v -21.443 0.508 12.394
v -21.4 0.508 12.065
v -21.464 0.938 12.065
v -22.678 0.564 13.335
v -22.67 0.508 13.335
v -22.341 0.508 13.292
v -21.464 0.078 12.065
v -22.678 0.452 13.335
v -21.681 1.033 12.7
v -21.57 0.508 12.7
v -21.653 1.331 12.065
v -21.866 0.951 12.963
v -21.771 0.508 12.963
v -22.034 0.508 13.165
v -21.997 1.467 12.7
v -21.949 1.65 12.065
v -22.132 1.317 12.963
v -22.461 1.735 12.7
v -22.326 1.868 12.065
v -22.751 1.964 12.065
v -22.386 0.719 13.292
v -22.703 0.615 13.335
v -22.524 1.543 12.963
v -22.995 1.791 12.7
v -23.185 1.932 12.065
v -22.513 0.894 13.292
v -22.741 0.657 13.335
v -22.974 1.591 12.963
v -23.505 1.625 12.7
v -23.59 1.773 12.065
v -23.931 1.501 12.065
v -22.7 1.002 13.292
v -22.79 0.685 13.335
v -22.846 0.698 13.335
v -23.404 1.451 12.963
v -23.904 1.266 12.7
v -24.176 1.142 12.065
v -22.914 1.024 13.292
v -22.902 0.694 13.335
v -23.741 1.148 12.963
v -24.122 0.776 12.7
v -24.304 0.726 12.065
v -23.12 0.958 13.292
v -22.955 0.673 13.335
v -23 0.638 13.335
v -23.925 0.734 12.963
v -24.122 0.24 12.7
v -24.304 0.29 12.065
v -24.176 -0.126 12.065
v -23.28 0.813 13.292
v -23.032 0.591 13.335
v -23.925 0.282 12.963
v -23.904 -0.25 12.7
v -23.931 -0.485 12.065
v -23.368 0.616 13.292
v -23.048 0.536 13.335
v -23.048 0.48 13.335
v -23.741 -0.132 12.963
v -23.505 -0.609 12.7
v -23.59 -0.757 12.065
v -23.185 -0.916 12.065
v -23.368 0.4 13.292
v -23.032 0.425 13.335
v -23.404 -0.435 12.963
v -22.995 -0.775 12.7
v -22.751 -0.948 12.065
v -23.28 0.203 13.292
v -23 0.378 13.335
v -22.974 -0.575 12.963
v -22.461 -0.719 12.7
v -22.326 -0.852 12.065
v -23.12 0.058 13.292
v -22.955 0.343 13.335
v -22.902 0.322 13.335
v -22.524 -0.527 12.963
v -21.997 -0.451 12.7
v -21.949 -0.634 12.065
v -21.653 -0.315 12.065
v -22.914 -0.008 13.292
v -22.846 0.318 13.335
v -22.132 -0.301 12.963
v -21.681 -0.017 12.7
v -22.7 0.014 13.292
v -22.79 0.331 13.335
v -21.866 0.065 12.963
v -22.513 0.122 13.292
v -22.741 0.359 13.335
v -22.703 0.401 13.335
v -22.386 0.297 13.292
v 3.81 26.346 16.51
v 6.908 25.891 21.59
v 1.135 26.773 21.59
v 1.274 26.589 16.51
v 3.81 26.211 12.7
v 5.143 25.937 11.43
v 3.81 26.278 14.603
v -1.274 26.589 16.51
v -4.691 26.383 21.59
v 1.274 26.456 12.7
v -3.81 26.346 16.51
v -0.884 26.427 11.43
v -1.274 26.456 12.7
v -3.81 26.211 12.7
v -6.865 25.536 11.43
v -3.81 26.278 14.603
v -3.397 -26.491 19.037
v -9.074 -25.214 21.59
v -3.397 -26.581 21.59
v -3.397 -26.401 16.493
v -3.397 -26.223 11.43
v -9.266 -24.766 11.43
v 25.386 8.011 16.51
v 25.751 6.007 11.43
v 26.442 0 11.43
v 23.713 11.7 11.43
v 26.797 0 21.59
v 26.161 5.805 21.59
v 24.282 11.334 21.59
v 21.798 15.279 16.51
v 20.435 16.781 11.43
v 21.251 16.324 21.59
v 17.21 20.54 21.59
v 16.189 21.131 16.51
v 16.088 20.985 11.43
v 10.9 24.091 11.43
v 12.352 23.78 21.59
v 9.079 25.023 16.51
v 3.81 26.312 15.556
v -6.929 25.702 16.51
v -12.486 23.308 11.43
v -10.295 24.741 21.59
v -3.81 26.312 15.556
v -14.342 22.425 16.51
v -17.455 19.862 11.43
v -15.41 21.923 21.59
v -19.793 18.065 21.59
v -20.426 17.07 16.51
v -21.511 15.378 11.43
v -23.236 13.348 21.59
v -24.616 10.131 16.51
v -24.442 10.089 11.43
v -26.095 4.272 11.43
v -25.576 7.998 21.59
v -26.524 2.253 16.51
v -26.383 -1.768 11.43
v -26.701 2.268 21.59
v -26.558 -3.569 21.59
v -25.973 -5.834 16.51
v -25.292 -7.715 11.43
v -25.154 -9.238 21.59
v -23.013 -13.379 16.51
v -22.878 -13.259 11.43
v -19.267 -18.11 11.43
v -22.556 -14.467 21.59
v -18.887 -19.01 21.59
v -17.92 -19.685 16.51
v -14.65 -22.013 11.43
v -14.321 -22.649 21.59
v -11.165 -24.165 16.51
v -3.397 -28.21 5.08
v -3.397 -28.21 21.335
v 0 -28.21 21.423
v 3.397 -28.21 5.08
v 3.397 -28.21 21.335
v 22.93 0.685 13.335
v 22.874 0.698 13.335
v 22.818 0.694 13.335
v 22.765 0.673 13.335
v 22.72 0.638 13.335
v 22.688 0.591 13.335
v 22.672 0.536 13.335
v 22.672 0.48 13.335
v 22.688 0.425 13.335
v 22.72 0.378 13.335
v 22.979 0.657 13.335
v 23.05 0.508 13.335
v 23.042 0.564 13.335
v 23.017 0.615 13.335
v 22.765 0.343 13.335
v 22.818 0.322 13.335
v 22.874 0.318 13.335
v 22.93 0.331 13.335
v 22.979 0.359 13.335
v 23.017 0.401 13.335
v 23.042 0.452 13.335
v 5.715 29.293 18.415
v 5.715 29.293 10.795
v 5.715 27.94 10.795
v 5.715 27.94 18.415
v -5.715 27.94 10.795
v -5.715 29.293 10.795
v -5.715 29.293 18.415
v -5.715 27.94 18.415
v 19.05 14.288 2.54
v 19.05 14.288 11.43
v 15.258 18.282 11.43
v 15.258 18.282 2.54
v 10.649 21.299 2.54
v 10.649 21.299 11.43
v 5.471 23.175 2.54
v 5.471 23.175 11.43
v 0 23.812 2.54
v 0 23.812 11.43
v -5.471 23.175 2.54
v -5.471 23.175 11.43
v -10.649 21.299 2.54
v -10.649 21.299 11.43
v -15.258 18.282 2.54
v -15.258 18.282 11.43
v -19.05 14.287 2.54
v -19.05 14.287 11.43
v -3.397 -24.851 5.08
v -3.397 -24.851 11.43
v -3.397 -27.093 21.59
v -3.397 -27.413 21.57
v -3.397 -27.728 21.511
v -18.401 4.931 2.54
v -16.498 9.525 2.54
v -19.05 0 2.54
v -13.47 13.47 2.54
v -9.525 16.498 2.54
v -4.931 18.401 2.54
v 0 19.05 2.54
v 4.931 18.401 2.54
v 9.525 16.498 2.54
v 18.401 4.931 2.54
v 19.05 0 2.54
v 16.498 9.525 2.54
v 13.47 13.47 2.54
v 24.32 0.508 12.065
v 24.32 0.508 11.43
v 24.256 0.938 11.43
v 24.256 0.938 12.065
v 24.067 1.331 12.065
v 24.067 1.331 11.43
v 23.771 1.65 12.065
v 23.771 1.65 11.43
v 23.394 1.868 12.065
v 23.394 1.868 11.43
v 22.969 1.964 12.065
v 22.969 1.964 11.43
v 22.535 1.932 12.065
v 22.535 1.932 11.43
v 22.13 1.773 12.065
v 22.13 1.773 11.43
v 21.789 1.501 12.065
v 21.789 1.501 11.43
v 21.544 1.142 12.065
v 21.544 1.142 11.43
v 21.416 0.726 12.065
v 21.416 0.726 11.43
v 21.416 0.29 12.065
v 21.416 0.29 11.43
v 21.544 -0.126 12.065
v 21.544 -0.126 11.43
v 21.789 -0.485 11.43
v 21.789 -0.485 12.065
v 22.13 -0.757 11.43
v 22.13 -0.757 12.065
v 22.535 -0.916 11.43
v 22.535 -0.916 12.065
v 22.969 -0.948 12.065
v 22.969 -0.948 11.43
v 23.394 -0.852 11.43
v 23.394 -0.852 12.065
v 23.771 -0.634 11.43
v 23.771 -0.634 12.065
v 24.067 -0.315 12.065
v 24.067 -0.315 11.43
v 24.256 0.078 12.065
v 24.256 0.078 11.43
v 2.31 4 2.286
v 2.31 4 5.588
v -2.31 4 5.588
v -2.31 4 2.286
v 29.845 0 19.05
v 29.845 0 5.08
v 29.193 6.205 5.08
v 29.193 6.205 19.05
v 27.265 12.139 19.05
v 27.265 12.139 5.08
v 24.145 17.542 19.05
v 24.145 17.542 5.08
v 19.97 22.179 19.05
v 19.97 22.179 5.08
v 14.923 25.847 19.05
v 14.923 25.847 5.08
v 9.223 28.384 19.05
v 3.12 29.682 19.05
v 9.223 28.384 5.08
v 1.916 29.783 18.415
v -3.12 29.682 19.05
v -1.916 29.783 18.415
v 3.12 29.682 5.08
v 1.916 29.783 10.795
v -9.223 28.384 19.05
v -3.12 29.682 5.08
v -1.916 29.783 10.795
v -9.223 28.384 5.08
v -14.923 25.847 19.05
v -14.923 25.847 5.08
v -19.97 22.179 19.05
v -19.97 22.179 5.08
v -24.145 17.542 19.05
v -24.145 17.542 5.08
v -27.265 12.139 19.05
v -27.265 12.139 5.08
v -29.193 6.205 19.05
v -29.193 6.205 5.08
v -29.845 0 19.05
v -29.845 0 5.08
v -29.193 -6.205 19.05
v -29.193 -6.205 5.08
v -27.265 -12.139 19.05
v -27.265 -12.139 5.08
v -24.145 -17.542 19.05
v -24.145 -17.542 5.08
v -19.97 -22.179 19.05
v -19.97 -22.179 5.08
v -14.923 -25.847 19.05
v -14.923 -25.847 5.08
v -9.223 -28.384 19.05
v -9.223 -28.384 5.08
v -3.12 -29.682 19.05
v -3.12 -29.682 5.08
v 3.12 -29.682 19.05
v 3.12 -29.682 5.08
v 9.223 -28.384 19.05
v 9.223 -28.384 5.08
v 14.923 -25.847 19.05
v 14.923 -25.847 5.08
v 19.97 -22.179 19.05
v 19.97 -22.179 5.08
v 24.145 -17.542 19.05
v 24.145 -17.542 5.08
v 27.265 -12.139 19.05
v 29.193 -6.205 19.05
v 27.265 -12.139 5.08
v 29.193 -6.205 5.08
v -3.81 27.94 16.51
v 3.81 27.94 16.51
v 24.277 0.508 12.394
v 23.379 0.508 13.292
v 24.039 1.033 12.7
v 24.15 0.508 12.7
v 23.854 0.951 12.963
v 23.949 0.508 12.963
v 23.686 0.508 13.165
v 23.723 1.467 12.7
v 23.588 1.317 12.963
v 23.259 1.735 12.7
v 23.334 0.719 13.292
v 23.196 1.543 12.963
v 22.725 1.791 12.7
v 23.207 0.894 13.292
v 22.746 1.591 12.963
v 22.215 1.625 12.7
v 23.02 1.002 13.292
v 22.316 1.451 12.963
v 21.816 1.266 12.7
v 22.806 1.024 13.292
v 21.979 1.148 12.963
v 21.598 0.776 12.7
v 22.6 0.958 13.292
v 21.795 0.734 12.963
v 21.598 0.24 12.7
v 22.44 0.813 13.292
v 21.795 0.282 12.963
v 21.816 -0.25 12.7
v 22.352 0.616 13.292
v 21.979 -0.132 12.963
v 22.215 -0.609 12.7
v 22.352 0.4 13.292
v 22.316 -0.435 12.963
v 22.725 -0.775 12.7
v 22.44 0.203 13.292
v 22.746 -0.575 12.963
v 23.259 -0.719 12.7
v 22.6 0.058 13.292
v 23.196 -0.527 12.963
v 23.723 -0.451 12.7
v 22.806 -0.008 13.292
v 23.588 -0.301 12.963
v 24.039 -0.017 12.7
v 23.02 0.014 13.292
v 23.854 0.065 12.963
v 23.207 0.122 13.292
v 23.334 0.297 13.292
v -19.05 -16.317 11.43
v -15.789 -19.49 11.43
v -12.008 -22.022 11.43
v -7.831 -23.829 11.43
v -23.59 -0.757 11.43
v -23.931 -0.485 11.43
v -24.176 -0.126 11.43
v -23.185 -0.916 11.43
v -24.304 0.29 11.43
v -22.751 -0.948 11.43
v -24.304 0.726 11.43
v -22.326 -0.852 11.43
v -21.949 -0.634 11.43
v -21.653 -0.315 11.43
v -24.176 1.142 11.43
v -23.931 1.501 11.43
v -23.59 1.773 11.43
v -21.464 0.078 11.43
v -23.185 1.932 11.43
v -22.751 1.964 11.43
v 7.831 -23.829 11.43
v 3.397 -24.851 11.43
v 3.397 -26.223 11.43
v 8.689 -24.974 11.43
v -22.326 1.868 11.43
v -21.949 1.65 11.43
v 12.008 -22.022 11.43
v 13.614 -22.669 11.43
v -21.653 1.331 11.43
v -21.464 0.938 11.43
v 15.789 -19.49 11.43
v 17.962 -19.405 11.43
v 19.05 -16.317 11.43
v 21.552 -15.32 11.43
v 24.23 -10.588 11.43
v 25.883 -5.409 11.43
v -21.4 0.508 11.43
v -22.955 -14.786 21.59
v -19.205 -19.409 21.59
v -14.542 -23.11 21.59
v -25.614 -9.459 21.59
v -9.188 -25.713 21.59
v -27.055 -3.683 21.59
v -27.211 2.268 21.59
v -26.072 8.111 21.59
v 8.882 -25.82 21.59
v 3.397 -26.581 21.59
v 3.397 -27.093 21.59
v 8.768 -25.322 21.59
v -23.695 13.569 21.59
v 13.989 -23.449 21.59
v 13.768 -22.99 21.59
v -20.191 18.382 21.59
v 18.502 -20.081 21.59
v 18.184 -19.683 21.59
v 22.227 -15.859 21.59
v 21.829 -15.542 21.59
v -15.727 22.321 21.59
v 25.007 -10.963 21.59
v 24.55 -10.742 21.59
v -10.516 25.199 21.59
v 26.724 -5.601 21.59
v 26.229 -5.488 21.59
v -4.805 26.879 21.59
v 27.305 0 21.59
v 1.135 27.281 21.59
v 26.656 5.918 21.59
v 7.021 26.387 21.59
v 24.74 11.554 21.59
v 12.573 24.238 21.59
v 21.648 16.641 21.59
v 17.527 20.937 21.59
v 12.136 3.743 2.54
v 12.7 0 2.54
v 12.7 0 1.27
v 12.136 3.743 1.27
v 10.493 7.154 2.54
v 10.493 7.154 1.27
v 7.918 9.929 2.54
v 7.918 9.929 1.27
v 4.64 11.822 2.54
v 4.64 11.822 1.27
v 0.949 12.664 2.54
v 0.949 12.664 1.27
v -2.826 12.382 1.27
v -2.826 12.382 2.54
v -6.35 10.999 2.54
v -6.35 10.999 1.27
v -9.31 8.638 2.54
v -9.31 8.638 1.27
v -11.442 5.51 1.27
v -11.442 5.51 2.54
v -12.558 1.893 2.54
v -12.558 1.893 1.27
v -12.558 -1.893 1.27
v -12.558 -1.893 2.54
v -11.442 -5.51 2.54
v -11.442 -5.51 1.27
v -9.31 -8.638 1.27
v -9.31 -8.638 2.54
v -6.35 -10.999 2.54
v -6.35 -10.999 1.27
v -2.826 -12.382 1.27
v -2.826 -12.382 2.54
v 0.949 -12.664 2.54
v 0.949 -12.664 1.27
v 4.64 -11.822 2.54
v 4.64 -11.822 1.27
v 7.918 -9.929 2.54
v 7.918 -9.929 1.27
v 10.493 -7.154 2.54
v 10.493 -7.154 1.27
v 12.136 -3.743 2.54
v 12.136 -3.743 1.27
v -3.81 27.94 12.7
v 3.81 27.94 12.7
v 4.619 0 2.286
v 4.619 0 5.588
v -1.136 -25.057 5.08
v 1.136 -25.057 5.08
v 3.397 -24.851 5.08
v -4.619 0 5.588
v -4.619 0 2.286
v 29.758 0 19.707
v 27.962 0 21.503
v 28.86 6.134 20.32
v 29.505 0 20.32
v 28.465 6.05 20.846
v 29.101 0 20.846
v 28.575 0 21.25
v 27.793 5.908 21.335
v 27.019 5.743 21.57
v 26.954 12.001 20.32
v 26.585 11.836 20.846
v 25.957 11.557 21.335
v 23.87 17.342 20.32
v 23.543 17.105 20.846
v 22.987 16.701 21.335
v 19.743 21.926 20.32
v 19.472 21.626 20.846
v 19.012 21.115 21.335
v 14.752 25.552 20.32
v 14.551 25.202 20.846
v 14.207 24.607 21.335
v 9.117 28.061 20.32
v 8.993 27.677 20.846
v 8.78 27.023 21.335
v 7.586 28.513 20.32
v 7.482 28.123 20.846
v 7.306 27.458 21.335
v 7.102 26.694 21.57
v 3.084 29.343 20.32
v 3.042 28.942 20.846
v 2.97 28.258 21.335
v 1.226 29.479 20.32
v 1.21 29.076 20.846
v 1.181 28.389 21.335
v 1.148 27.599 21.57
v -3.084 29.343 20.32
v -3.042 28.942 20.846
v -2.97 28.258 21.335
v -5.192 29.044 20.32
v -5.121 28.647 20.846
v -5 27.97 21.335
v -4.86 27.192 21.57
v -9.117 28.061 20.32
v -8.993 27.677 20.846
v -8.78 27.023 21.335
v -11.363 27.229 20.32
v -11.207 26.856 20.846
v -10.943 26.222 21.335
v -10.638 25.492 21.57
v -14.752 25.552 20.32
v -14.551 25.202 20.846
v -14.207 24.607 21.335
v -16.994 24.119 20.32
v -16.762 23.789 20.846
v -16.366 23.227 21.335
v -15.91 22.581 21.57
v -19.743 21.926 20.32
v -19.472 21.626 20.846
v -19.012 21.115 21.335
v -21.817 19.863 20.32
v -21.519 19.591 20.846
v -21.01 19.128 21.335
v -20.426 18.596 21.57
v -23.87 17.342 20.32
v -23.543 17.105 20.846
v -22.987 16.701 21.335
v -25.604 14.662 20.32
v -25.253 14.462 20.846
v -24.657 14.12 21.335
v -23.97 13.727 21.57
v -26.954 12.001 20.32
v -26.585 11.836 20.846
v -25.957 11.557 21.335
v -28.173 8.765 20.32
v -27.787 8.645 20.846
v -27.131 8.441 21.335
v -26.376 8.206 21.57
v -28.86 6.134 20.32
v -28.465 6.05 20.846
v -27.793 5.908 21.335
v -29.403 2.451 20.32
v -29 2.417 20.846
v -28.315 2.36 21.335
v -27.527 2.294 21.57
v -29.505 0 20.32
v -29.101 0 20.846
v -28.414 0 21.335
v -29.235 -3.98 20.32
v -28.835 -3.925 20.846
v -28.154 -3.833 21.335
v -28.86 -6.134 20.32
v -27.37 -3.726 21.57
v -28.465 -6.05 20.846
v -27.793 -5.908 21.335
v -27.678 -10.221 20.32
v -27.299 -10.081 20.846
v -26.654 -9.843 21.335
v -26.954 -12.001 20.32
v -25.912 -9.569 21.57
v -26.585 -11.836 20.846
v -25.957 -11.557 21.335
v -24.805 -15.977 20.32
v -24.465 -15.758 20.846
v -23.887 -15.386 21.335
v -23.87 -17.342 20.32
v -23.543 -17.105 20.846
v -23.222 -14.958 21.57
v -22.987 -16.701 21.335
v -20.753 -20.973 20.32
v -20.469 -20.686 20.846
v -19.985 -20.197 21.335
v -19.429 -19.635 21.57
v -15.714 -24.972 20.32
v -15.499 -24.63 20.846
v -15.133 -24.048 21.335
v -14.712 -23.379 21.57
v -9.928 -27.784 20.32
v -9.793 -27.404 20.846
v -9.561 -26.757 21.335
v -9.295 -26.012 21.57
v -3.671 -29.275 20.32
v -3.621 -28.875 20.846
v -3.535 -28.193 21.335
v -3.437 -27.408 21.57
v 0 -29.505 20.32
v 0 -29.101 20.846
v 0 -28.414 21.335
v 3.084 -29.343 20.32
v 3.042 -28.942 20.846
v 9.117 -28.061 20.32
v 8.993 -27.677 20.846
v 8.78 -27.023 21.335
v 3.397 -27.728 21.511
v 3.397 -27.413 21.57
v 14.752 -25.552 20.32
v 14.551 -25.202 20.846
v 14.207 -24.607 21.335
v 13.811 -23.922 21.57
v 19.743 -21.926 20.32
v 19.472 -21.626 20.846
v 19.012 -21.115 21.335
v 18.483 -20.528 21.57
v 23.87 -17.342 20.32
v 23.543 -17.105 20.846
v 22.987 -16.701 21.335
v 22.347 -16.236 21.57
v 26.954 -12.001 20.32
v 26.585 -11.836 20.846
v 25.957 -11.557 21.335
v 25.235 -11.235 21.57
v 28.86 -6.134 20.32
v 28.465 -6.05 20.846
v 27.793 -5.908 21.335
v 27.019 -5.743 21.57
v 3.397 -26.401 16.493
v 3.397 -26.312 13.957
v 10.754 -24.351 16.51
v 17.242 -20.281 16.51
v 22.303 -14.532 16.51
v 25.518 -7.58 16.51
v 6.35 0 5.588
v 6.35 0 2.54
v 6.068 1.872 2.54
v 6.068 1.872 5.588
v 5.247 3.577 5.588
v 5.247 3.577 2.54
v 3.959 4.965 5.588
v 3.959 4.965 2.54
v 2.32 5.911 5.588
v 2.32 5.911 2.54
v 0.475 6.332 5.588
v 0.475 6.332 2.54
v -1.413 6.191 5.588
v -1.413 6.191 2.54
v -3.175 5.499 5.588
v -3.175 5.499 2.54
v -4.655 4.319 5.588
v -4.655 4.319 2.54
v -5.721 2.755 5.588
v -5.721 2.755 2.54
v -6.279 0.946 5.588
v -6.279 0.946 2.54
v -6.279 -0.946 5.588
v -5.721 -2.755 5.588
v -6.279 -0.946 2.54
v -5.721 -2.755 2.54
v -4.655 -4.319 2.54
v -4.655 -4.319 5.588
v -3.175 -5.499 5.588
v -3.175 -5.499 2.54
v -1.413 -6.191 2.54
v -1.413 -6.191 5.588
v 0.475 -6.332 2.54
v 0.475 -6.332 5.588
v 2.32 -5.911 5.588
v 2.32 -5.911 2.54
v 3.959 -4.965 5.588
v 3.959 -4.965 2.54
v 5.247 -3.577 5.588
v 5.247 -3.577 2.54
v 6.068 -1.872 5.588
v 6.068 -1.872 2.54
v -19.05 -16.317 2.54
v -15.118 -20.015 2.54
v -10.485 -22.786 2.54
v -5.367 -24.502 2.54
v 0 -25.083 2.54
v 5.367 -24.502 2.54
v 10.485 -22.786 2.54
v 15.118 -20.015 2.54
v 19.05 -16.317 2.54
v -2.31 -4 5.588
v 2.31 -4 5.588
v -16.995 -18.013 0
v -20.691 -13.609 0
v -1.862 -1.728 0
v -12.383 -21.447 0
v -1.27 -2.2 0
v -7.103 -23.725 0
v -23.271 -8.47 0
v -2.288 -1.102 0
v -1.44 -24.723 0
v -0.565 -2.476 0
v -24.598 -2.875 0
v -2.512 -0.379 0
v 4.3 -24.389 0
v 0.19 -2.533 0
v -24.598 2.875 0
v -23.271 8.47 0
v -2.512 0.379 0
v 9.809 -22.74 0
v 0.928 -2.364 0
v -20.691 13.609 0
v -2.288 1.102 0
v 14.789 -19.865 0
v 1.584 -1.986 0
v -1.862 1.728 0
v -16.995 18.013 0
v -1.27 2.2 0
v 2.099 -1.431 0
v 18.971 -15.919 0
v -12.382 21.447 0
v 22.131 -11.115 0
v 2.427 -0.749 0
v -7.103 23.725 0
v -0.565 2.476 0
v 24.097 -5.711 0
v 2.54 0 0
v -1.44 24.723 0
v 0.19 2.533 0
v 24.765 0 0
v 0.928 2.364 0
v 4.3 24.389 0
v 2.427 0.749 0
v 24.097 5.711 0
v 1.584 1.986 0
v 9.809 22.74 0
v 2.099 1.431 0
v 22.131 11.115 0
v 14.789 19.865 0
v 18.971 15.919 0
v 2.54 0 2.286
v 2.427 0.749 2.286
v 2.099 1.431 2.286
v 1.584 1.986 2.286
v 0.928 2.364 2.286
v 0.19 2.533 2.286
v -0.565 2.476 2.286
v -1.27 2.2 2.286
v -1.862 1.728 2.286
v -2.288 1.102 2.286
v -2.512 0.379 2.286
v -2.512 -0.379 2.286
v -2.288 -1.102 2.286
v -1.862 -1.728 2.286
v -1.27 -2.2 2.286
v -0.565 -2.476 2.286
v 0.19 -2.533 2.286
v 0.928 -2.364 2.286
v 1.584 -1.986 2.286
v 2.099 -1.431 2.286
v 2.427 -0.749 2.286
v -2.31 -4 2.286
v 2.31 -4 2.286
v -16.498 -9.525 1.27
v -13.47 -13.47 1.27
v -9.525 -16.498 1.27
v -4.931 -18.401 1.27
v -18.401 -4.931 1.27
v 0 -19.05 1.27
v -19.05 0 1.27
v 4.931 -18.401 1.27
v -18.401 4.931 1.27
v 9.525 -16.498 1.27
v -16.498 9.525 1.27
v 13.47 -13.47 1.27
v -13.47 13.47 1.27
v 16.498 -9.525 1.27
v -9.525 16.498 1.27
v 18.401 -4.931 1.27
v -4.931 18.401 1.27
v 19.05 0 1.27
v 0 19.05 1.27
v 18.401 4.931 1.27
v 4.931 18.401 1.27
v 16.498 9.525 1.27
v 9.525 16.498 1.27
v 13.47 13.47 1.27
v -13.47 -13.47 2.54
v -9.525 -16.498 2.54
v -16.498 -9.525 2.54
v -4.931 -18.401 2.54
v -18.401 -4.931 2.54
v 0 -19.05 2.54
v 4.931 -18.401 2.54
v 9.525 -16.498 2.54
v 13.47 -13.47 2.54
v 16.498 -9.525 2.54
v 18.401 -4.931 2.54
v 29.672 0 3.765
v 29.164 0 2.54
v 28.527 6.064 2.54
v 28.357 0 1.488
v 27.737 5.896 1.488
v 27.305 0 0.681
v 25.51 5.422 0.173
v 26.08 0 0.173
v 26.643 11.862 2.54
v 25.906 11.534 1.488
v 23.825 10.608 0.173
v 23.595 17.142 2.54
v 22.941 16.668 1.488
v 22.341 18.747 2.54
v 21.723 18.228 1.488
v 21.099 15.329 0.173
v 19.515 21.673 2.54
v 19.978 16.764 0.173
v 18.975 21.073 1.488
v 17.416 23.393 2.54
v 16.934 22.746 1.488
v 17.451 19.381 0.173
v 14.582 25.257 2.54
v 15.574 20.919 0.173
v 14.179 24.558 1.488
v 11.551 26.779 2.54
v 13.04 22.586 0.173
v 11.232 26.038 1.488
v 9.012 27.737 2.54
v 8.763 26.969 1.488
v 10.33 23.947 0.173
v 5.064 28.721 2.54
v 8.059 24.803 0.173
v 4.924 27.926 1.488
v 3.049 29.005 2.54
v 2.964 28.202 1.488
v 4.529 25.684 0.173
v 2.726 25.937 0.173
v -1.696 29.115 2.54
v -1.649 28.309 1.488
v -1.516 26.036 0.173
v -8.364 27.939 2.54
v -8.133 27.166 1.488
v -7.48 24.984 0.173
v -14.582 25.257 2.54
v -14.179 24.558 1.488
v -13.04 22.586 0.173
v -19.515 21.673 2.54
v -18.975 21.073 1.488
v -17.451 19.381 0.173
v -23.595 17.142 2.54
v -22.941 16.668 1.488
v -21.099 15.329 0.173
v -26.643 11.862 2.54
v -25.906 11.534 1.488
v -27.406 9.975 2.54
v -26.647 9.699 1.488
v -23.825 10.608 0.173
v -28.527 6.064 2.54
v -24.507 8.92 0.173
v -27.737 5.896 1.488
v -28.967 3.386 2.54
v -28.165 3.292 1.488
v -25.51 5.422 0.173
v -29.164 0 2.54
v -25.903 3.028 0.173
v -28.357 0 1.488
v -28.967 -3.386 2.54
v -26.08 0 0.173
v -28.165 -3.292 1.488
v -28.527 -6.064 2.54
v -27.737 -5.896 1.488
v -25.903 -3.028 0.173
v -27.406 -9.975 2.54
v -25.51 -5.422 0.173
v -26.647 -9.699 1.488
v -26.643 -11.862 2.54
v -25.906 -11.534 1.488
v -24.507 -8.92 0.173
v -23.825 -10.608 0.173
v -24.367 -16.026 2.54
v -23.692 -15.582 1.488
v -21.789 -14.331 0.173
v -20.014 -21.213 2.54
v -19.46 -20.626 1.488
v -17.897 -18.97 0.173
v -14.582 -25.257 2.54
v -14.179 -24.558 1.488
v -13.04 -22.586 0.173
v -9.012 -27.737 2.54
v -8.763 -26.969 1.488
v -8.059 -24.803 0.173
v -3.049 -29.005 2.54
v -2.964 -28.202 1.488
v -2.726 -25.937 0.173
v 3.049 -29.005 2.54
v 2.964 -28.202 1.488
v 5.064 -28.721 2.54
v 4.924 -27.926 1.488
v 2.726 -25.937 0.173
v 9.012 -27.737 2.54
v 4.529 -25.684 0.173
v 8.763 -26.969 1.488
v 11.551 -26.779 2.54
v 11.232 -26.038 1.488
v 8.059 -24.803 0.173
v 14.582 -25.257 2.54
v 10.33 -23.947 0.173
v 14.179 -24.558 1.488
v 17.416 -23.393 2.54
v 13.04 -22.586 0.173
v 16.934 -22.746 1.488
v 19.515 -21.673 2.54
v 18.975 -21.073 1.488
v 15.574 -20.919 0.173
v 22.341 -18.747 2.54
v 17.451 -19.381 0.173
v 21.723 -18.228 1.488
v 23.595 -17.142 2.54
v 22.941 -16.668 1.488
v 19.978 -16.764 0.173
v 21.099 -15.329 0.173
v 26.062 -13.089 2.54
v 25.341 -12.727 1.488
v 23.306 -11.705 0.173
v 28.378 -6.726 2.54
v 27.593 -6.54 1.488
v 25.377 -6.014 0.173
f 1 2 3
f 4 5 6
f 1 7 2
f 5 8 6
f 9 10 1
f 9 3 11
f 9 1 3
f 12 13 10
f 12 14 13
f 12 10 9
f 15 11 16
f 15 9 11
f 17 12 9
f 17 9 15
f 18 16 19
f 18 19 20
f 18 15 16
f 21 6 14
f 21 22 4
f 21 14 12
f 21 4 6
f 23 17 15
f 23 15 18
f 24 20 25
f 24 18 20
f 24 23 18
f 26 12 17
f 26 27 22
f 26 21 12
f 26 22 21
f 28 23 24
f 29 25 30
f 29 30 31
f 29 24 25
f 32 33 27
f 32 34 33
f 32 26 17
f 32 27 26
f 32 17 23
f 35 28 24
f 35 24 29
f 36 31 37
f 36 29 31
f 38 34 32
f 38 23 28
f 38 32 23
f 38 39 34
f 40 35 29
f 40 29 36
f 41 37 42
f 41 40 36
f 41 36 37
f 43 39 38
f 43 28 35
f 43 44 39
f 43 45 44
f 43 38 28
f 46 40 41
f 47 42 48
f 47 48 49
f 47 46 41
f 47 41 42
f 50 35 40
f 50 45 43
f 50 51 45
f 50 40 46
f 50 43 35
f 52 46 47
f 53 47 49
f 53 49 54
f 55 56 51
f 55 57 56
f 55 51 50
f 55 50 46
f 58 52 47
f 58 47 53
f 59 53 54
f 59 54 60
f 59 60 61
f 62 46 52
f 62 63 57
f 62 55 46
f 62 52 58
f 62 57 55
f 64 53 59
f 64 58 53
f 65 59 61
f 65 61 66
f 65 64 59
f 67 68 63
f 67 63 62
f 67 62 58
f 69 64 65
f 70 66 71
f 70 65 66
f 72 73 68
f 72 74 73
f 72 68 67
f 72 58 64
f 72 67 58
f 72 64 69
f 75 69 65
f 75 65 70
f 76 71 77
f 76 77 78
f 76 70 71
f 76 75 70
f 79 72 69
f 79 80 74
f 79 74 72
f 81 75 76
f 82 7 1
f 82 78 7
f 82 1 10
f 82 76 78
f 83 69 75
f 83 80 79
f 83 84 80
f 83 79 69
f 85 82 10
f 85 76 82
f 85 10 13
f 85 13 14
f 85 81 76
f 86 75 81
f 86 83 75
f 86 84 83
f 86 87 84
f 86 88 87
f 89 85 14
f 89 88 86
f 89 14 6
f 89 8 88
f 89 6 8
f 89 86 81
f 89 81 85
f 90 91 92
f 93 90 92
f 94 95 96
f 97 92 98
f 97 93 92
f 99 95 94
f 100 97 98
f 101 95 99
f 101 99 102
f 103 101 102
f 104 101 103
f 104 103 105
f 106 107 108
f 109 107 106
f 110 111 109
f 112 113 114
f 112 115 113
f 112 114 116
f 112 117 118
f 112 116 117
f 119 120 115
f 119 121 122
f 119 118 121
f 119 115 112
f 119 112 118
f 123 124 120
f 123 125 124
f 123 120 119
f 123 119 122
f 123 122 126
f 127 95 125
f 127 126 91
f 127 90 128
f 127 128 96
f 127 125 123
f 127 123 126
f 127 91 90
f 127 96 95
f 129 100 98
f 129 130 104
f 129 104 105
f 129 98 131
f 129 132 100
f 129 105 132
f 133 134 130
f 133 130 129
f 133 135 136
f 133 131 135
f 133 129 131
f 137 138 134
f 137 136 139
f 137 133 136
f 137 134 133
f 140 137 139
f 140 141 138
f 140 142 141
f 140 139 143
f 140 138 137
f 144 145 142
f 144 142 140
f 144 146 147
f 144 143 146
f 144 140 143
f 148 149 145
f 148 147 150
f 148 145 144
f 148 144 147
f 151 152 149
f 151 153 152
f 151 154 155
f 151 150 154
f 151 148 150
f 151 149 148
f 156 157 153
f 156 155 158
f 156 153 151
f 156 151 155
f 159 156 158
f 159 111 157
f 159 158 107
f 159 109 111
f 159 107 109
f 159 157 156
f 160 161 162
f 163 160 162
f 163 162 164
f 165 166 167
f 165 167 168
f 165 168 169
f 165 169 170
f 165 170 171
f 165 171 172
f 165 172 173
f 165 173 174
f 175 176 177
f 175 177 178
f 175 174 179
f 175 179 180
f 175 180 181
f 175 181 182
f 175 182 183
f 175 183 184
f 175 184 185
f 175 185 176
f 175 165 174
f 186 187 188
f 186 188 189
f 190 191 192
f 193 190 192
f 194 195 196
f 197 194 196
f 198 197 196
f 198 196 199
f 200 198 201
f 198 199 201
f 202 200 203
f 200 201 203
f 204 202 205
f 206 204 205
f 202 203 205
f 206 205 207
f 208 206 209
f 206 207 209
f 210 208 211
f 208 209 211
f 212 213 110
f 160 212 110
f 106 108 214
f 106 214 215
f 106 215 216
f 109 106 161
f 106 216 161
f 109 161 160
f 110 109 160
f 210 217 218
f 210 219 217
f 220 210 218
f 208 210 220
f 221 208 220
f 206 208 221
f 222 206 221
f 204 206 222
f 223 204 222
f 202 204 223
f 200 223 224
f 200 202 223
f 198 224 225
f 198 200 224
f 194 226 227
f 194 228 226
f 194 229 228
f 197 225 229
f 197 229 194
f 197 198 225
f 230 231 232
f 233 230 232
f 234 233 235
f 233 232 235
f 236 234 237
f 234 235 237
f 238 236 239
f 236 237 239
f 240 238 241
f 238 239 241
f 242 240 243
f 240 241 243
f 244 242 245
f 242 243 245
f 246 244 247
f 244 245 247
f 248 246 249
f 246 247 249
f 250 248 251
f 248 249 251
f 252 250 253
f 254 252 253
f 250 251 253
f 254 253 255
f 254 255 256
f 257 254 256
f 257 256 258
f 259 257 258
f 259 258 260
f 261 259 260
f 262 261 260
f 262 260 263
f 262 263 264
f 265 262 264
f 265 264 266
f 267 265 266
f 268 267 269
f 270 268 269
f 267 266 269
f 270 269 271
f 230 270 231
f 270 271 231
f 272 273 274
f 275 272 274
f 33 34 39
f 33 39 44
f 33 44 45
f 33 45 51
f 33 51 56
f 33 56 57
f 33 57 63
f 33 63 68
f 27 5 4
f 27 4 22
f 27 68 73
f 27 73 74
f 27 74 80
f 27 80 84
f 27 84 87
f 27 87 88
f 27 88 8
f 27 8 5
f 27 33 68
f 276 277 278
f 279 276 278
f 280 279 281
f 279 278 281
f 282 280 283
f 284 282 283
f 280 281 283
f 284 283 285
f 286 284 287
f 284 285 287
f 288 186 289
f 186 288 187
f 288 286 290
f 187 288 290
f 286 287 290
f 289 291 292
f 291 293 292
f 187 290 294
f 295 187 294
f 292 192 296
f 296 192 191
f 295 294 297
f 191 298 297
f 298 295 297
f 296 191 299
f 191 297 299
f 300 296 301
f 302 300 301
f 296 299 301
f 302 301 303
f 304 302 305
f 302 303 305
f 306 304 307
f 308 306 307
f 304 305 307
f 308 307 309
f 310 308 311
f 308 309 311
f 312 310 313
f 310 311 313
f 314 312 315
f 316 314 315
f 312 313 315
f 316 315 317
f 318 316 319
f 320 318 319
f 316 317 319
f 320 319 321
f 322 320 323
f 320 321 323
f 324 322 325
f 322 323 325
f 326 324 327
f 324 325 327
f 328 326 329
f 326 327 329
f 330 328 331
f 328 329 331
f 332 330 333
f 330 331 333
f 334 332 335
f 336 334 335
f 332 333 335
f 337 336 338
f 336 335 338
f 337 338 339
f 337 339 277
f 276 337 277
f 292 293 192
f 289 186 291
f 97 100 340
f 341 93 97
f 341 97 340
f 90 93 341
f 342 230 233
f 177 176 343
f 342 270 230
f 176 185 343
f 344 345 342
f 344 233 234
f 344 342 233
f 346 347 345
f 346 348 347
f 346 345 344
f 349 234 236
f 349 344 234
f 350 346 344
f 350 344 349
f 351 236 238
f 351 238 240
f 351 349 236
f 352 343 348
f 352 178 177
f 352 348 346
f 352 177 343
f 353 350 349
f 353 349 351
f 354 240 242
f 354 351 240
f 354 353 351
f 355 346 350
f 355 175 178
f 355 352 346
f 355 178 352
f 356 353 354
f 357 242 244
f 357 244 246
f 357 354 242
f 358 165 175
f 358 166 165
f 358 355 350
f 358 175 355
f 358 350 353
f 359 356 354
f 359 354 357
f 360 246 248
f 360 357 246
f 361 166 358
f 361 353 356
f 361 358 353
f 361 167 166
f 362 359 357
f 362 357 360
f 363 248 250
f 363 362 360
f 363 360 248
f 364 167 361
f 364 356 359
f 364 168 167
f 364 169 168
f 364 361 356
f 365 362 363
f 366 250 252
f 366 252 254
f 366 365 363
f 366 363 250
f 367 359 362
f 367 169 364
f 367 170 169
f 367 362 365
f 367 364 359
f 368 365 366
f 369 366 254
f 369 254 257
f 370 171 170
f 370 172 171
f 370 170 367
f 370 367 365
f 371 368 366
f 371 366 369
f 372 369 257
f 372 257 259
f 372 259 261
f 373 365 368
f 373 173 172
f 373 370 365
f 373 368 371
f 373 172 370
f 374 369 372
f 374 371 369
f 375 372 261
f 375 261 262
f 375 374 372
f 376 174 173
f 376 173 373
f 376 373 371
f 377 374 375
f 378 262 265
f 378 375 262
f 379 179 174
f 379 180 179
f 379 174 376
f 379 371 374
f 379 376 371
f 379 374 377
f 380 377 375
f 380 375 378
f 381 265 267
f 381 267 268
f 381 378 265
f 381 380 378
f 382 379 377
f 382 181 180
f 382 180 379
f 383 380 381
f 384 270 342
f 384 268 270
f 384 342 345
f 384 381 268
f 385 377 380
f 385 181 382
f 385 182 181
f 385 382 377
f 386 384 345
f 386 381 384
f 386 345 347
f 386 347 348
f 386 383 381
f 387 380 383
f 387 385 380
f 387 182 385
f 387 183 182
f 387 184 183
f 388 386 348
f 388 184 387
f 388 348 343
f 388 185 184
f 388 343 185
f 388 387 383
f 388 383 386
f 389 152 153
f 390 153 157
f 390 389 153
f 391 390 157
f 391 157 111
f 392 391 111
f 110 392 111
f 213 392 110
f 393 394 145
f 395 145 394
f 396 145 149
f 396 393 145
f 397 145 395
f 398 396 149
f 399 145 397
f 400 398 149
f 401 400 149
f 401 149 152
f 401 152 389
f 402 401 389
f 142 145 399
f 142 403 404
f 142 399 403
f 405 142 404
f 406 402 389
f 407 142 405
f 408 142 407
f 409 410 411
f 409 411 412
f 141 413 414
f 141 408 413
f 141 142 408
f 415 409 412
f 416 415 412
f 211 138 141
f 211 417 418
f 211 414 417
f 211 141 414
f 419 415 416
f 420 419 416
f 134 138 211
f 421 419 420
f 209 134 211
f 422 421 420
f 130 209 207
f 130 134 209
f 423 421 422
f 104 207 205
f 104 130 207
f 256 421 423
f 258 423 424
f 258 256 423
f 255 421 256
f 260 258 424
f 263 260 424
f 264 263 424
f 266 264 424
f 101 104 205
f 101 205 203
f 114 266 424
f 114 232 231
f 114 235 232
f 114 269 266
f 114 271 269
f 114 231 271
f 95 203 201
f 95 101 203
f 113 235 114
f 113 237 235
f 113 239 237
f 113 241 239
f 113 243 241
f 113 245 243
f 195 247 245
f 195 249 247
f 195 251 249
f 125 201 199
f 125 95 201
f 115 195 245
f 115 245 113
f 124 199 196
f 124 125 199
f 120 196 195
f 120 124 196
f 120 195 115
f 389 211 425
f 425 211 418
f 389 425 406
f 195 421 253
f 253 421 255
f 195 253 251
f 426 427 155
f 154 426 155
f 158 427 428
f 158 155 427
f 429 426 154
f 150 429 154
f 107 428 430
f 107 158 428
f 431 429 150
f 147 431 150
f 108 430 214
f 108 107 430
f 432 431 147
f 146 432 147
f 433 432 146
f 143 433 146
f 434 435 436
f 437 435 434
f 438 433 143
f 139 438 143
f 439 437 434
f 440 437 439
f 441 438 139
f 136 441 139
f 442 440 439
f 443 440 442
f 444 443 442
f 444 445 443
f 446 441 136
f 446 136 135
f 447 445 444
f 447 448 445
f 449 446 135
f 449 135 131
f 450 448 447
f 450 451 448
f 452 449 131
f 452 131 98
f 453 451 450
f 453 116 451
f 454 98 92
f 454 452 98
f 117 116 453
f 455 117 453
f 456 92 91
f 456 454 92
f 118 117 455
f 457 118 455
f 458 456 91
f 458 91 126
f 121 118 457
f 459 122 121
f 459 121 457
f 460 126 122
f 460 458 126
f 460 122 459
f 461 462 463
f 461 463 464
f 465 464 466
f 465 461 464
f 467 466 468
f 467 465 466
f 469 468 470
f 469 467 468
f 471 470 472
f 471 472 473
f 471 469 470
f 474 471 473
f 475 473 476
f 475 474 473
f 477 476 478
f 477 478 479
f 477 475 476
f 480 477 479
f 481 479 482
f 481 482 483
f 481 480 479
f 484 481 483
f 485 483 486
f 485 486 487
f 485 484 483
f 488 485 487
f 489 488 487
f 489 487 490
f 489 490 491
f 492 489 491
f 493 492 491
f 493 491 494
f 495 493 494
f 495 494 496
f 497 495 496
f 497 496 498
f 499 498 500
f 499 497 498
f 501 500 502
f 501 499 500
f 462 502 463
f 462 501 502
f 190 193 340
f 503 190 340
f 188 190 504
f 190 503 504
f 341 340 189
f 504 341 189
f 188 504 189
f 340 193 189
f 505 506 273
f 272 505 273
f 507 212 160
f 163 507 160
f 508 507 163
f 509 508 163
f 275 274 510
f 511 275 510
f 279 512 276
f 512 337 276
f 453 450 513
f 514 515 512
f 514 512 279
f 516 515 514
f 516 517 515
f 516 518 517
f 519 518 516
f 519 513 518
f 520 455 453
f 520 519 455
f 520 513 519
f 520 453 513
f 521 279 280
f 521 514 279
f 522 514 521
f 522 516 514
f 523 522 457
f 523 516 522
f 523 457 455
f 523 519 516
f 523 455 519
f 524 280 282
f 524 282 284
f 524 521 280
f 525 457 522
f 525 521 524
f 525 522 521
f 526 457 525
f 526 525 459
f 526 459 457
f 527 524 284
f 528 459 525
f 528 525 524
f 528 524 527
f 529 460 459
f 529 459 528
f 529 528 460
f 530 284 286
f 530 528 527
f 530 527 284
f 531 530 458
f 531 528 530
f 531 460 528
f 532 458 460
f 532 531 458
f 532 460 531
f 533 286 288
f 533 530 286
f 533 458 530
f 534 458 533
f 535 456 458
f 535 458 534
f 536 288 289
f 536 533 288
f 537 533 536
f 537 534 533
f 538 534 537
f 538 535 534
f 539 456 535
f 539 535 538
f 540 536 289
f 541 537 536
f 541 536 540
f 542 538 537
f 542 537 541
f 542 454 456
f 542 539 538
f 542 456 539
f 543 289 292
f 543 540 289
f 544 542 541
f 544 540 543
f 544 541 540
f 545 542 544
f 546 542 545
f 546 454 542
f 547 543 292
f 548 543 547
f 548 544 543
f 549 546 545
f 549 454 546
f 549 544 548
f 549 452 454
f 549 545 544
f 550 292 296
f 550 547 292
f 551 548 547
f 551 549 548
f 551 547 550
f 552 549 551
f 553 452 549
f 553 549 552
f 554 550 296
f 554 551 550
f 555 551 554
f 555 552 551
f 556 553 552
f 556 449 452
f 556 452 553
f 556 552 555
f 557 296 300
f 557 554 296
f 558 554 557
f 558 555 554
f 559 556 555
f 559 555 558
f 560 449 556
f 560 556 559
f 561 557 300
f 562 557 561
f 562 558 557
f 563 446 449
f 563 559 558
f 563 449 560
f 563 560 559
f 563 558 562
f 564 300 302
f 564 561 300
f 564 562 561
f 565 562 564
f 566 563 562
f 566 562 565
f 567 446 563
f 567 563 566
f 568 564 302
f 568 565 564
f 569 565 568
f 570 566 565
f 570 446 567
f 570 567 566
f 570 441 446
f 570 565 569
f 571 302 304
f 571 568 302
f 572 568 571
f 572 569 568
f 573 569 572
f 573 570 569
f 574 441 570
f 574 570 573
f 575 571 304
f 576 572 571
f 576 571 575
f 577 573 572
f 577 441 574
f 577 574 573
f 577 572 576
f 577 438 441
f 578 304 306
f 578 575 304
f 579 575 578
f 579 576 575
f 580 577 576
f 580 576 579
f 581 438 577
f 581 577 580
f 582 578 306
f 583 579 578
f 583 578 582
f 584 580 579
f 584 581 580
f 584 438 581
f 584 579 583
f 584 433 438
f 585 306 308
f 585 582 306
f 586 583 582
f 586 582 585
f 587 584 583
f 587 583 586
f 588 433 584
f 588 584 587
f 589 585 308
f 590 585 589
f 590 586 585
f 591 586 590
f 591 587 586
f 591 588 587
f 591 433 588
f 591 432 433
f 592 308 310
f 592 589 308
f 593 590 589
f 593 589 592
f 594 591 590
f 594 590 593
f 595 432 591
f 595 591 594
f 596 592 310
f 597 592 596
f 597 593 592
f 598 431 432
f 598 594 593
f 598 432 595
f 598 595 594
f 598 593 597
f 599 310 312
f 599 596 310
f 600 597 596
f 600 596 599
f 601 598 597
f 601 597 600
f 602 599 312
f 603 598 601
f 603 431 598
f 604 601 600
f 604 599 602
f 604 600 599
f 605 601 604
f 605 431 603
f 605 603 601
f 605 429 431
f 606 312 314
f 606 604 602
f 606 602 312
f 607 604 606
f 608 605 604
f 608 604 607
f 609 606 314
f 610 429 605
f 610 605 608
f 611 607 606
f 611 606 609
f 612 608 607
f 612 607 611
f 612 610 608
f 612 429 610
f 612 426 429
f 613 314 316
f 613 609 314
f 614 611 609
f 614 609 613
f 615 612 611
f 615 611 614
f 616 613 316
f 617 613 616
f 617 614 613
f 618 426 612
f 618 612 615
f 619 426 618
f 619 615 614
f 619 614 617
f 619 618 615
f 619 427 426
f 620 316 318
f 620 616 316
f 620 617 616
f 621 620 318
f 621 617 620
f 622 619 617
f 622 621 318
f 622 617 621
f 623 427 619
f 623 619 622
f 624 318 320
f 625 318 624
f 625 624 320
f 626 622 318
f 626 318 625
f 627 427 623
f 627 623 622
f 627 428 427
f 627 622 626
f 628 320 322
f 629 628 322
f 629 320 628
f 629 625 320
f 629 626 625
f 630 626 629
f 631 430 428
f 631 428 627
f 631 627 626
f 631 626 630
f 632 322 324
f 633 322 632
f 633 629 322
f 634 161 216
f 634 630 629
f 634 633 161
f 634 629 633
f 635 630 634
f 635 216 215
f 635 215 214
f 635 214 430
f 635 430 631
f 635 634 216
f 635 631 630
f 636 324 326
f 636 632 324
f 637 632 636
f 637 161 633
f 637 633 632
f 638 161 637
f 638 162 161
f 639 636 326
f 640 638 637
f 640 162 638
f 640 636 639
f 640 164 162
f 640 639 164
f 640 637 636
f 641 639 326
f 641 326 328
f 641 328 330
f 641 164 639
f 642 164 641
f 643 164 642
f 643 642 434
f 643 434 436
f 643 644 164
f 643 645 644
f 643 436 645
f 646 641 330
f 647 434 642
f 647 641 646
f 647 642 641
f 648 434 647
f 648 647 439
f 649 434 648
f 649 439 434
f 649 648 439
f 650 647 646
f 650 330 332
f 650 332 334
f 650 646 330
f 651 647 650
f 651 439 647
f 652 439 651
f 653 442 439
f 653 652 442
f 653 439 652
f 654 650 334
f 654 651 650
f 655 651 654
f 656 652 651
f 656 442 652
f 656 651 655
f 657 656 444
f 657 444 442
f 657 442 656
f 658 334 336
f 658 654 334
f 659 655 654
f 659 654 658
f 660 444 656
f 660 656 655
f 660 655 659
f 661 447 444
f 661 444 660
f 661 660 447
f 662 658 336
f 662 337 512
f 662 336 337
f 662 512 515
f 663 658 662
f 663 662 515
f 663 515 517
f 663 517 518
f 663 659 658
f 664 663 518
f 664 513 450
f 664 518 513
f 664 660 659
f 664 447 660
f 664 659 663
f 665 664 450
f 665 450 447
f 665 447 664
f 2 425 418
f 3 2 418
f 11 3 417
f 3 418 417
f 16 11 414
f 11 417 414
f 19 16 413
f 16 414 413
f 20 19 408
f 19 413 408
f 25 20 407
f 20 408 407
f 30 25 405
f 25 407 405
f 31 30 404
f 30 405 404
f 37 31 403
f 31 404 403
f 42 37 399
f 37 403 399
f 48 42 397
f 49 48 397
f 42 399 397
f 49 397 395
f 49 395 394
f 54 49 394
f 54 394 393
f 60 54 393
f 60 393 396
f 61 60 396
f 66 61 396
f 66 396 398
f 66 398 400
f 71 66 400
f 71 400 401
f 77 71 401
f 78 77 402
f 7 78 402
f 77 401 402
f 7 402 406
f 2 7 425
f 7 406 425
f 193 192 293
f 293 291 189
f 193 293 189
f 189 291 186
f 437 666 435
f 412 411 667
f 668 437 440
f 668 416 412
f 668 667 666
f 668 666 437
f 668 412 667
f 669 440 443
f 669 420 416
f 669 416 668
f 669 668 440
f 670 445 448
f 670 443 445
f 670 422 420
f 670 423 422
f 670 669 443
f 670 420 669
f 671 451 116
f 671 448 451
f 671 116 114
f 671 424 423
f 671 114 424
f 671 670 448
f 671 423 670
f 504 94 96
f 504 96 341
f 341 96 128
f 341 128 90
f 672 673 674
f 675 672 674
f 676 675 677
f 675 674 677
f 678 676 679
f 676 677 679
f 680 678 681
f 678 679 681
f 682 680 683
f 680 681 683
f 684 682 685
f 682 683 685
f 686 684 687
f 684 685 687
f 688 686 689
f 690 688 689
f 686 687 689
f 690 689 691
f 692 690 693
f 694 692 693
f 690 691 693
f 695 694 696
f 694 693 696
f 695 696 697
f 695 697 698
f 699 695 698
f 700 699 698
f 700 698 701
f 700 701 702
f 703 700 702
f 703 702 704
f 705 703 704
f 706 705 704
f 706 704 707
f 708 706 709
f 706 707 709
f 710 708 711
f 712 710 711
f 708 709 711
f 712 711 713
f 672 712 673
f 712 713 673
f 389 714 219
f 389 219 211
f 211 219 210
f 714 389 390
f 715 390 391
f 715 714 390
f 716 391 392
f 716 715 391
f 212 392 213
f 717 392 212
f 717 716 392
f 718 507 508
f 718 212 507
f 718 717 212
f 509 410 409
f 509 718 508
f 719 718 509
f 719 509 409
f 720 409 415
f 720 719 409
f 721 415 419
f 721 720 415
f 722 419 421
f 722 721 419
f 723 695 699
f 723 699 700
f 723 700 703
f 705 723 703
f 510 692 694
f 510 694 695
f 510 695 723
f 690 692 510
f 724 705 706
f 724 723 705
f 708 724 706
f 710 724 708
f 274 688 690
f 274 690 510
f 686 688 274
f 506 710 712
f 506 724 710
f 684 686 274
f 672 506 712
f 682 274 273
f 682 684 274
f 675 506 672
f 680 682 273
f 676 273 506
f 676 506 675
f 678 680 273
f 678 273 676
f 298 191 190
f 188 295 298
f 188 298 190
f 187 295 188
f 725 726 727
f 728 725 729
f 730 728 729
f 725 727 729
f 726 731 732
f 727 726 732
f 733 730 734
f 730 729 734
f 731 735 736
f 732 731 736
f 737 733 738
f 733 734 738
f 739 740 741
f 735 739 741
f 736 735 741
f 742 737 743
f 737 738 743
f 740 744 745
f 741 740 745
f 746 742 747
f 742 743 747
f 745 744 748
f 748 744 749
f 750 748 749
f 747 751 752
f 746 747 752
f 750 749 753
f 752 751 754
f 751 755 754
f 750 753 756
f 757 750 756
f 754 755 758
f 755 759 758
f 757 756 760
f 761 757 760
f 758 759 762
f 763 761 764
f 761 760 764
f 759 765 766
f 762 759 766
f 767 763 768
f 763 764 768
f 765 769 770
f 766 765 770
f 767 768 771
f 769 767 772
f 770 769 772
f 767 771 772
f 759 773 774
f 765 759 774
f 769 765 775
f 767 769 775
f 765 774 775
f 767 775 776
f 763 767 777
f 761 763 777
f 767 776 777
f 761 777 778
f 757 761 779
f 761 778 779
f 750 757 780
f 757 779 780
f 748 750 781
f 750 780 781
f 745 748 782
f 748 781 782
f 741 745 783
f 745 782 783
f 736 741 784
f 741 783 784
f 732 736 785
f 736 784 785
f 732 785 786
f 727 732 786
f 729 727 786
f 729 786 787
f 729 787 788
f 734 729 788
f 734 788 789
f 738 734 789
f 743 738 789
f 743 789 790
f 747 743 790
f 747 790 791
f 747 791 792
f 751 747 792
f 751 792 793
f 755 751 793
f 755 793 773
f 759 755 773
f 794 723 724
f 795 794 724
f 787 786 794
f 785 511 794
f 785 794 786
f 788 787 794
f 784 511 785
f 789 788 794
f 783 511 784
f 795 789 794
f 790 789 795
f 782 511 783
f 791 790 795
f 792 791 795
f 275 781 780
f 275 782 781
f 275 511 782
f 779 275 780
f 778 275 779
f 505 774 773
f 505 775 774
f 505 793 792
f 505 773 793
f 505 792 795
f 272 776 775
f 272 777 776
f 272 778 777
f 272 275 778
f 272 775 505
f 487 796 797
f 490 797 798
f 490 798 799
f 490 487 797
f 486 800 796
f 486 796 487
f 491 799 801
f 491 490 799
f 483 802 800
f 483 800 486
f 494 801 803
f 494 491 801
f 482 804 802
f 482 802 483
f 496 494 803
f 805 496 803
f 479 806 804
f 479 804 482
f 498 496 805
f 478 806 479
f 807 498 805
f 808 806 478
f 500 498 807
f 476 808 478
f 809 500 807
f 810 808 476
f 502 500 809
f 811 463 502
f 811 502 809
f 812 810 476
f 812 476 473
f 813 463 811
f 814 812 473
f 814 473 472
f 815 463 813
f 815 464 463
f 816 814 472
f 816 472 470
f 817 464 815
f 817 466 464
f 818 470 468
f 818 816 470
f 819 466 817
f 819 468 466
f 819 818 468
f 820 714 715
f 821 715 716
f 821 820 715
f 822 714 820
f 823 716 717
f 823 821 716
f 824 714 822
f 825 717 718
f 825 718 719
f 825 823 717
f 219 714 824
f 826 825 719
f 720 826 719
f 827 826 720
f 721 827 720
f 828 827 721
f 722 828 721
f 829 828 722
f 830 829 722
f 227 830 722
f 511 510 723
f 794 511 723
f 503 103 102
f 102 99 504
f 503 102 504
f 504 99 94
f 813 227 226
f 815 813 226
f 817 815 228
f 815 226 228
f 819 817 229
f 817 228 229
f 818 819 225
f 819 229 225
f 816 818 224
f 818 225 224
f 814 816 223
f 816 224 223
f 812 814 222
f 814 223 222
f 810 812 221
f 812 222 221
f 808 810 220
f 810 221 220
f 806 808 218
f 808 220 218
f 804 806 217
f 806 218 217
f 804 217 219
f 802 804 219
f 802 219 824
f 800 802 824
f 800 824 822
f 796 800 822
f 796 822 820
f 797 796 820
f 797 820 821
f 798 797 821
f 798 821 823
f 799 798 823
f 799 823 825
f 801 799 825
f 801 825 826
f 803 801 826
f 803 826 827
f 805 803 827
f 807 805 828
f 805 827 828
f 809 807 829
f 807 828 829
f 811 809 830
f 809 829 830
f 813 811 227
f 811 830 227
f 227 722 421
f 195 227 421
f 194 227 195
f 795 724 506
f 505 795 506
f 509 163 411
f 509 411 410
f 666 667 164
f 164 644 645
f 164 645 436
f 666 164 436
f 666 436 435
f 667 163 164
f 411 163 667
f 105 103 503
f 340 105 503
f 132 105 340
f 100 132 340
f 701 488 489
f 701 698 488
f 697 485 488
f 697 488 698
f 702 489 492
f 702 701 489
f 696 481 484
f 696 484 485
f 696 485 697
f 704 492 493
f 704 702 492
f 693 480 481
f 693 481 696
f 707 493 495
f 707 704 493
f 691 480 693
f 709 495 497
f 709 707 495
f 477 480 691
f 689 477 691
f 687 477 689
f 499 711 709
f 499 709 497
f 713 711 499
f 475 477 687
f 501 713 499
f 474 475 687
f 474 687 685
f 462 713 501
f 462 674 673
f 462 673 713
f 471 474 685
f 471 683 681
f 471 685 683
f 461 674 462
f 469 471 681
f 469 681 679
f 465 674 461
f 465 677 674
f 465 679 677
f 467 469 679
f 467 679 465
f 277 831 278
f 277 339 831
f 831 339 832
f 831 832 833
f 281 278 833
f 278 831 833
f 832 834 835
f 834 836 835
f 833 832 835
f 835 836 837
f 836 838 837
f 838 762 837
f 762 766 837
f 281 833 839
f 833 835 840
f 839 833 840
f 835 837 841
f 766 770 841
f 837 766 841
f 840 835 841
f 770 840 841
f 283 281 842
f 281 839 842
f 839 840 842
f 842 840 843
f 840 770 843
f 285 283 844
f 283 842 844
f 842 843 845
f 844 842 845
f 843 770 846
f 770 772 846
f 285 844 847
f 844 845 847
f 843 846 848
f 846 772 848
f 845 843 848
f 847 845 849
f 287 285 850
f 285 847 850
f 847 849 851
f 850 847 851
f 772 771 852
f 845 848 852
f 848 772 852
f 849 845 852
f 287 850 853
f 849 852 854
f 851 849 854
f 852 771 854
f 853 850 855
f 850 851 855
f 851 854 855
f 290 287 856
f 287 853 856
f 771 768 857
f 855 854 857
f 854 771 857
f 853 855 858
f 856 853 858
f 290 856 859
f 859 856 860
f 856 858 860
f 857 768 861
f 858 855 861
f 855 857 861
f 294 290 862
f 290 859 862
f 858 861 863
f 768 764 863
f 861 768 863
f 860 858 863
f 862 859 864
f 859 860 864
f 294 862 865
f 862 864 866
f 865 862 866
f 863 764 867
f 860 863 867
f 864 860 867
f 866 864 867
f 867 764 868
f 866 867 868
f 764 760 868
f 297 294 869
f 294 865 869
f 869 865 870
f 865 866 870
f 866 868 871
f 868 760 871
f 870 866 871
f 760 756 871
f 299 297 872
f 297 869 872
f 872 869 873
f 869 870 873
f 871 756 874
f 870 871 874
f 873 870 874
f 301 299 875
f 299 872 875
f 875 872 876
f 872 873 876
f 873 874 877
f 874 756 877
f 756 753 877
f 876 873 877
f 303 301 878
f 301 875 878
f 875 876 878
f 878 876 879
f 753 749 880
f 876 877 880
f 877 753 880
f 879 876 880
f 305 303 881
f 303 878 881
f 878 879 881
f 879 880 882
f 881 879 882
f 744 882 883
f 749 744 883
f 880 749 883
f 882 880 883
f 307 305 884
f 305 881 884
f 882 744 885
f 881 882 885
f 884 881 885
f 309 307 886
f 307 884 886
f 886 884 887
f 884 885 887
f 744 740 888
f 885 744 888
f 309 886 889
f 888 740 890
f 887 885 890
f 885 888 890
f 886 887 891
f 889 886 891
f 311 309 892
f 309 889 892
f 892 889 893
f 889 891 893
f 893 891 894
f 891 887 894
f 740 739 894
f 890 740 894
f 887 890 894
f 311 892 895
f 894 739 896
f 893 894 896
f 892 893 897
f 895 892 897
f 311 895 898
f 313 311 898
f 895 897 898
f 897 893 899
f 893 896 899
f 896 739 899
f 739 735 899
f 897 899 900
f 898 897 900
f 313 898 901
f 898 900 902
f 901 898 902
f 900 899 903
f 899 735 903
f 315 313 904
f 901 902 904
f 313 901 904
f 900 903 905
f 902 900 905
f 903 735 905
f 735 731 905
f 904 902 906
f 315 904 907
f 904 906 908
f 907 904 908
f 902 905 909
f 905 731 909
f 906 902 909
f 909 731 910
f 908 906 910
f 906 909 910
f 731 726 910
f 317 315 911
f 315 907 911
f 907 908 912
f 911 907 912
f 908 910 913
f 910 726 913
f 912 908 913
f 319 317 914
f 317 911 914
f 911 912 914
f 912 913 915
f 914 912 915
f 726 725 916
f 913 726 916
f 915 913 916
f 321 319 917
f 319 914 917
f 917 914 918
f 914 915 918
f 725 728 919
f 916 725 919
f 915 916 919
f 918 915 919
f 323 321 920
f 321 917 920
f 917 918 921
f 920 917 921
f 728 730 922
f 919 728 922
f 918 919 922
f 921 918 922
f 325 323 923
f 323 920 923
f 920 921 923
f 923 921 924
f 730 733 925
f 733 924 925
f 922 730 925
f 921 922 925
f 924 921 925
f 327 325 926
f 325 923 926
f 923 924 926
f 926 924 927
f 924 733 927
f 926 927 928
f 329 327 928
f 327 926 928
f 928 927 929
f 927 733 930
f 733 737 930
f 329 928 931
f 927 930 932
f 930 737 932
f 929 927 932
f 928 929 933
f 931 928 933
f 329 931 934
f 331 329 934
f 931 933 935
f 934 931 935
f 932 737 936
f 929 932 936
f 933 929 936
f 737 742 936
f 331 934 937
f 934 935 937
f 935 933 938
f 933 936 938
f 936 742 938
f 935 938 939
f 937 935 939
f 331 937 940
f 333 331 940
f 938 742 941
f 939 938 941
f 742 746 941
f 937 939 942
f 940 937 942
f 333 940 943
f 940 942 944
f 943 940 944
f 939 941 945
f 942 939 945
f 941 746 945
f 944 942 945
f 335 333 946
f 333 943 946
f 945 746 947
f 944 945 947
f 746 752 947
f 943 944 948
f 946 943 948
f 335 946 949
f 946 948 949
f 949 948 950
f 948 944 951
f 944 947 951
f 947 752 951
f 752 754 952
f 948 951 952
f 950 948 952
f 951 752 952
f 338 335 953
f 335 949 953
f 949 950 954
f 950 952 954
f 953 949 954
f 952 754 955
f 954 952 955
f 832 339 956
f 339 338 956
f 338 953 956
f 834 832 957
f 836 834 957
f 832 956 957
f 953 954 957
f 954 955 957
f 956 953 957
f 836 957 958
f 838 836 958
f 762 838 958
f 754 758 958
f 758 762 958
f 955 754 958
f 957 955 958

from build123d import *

# Parameters (mm, degrees)
F0_R      = 29.845
F1_DEPTH  = 21.59
F2_R      = 26.797
F3_DEPTH  = 10.16
F3_TAPER  = 2
F4_R      = 23.8125
F5_DEPTH  = 8.89
F6_R      = 6.35
F7_DEPTH  = 3.048
F8_R      = 2.54
F9_DEPTH  = 25.4
F12_DEPTH = 3.302
F13_R     = 5.08
F14_R     = 2.54
F15_R     = 19.05
F15_R_2   = 12.7
F16_DEPTH = 1.27
F18_DEPTH = 8.89
F19_R     = 1.4605
F20_DEPTH = 1.905
F21_R     = 1.27
F22_W     = 7.62
F22_H     = 3.81
F23_DEPTH = 36.576
F25_DEPTH = 16.51
F27_DEPTH = 19.0510001
F29_W     = 11.43
F29_H     = 7.62
F30_DEPTH = 3.81


with BuildPart() as f1:
    # F0 (on Top) → F1 (new body)
    with BuildSketch(Plane.XY):
        Circle(F0_R)
    extrude(amount=F1_DEPTH)

    # F2 (on face) → F3 (cut)
    with BuildSketch(Plane.XY.offset(21.59)):
        Circle(F2_R)
    extrude(amount=-F3_DEPTH, taper=F3_TAPER, mode=Mode.SUBTRACT)

    # F4 (on face) → F5 (cut)
    with BuildSketch(Plane.XY.offset(11.43)):
        Circle(F4_R)
    extrude(amount=-F5_DEPTH, mode=Mode.SUBTRACT)

    # F6 (on face) → F7 (join)
    with BuildSketch(Plane.XY.offset(2.54)):
        Circle(F6_R)
    extrude(amount=F7_DEPTH)

    # F8 (on face) → F9 (cut)
    with BuildSketch(Plane.XY.offset(5.588)):
        Circle(F8_R)
    extrude(amount=-F9_DEPTH, mode=Mode.SUBTRACT)

    # F11 (on offset) → F12 (cut)
    with BuildSketch(Plane.XY.offset(5.588)):
        Polygon((-2.3096897519, -4.0005), (2.3096897519, -4.0005), (4.6193795038, 0), (2.3096897519, 4.0005), (-2.3096897519, 4.0005), (-4.6193795038, 0), align=None)
    extrude(amount=-F12_DEPTH, mode=Mode.SUBTRACT)

    # F13
    f13_edges = [f1.edges().sort_by_distance(p)[0] for p in [
        (-29.845, 0, 0),
    ]]
    fillet(f13_edges, radius=F13_R)

    # F14
    f14_edges = [f1.edges().sort_by_distance(p)[0] for p in [
        (-29.845, 0, 21.59),
    ]]
    fillet(f14_edges, radius=F14_R)

    # F15 (on face) → F16 (cut)
    with BuildSketch(Plane.XY.offset(2.54)):
        Circle(F15_R)
        Circle(F15_R_2, mode=Mode.SUBTRACT)
    extrude(amount=-F16_DEPTH, mode=Mode.SUBTRACT)

    # F17 (on face) → F18 (join, through all)
    with BuildSketch(Plane.XY.offset(2.54)):
        with BuildLine():
            Line((-19.05, 0), (-19.05, 14.2875))
            ThreePointArc((-19.05, 14.2875), (-23.8125, 0), (-19.05, -14.2875))
            Line((-19.05, -14.2875), (-19.05, 0))
        make_face()
        with BuildLine():
            ThreePointArc((23.8125, 0), (22.5905210348, 7.5301736783), (19.05, 14.2875))
            Line((19.05, 14.2875), (19.05, 0))
            Line((19.05, 0), (19.05, -14.2875))
            ThreePointArc((19.05, -14.2875), (22.5905210348, -7.5301736783), (23.8125, 0))
        make_face()
    extrude(amount=F18_DEPTH)

    # F19 (on face) → F20 (join)
    with BuildSketch(Plane.XY.offset(11.43)):
        with Locations((-22.86, 0.508)):
            Circle(F19_R)
        with Locations((22.86, 0.508)):
            Circle(F19_R)
    extrude(amount=F20_DEPTH)

    # F21
    f21_edges = [f1.edges().sort_by_distance(p)[0] for p in [
        (-24.3205, 0.508, 13.335),
        (21.3995, 0.508, 13.335),
    ]]
    fillet(f21_edges, radius=F21_R)

    # F22 (on Front) → F23 (cut)
    with BuildSketch(Plane.XZ):
        with Locations((0, 14.605)):
            Rectangle(F22_W, F22_H)
    extrude(amount=-F23_DEPTH, mode=Mode.SUBTRACT)

    # F24 (on face) → F25 (cut)
    with BuildSketch(Plane.XY.offset(21.59)):
        with BuildLine():
            ThreePointArc((-3.39725, -26.5807806777), (0, -26.797), (3.39725, -26.5807806777))
            Line((3.39725, -26.5807806777), (3.39725, -23.129734925))
            Line((3.39725, -23.129734925), (-3.39725, -23.129734925))
            Line((-3.39725, -23.129734925), (-3.39725, -26.5807806777))
        make_face()
        with BuildLine():
            Line((-3.39725, -28.209734925), (3.39725, -28.209734925))
            Line((3.39725, -28.209734925), (3.39725, -27.0928351679))
            ThreePointArc((3.39725, -27.0928351679), (0, -27.305), (-3.39725, -27.0928351679))
            Line((-3.39725, -27.0928351679), (-3.39725, -28.209734925))
        make_face()
        with BuildLine():
            ThreePointArc((-3.39725, -27.0928351679), (0, -27.305), (3.39725, -27.0928351679))
            Line((3.39725, -27.0928351679), (3.39725, -26.5807806777))
            ThreePointArc((3.39725, -26.5807806777), (0, -26.797), (-3.39725, -26.5807806777))
            Line((-3.39725, -26.5807806777), (-3.39725, -27.0928351679))
        make_face()
    extrude(amount=-F25_DEPTH, mode=Mode.SUBTRACT)

    # F26 (on face) → F27 (cut, through all)
    with BuildSketch(Plane.XY.offset(2.54)):
        with BuildLine():
            ThreePointArc((19.05, -14.2875), (0, -23.8125), (-19.05, -14.2875))
            Line((-19.05, -14.2875), (-19.05, -16.3165347501))
            ThreePointArc((-19.05, -16.3165347501), (0, -25.0825), (19.05, -16.3165347501))
            Line((19.05, -16.3165347501), (19.05, -14.2875))
        make_face()
    extrude(amount=F27_DEPTH, mode=Mode.SUBTRACT)

    # F29 (on offset) → F30 (cut)
    with BuildSketch(Plane.XZ.offset(-31.75)):
        with Locations((0, 14.605)):
            Rectangle(F29_W, F29_H)
    extrude(amount=F30_DEPTH, mode=Mode.SUBTRACT)


solid = f1.part
